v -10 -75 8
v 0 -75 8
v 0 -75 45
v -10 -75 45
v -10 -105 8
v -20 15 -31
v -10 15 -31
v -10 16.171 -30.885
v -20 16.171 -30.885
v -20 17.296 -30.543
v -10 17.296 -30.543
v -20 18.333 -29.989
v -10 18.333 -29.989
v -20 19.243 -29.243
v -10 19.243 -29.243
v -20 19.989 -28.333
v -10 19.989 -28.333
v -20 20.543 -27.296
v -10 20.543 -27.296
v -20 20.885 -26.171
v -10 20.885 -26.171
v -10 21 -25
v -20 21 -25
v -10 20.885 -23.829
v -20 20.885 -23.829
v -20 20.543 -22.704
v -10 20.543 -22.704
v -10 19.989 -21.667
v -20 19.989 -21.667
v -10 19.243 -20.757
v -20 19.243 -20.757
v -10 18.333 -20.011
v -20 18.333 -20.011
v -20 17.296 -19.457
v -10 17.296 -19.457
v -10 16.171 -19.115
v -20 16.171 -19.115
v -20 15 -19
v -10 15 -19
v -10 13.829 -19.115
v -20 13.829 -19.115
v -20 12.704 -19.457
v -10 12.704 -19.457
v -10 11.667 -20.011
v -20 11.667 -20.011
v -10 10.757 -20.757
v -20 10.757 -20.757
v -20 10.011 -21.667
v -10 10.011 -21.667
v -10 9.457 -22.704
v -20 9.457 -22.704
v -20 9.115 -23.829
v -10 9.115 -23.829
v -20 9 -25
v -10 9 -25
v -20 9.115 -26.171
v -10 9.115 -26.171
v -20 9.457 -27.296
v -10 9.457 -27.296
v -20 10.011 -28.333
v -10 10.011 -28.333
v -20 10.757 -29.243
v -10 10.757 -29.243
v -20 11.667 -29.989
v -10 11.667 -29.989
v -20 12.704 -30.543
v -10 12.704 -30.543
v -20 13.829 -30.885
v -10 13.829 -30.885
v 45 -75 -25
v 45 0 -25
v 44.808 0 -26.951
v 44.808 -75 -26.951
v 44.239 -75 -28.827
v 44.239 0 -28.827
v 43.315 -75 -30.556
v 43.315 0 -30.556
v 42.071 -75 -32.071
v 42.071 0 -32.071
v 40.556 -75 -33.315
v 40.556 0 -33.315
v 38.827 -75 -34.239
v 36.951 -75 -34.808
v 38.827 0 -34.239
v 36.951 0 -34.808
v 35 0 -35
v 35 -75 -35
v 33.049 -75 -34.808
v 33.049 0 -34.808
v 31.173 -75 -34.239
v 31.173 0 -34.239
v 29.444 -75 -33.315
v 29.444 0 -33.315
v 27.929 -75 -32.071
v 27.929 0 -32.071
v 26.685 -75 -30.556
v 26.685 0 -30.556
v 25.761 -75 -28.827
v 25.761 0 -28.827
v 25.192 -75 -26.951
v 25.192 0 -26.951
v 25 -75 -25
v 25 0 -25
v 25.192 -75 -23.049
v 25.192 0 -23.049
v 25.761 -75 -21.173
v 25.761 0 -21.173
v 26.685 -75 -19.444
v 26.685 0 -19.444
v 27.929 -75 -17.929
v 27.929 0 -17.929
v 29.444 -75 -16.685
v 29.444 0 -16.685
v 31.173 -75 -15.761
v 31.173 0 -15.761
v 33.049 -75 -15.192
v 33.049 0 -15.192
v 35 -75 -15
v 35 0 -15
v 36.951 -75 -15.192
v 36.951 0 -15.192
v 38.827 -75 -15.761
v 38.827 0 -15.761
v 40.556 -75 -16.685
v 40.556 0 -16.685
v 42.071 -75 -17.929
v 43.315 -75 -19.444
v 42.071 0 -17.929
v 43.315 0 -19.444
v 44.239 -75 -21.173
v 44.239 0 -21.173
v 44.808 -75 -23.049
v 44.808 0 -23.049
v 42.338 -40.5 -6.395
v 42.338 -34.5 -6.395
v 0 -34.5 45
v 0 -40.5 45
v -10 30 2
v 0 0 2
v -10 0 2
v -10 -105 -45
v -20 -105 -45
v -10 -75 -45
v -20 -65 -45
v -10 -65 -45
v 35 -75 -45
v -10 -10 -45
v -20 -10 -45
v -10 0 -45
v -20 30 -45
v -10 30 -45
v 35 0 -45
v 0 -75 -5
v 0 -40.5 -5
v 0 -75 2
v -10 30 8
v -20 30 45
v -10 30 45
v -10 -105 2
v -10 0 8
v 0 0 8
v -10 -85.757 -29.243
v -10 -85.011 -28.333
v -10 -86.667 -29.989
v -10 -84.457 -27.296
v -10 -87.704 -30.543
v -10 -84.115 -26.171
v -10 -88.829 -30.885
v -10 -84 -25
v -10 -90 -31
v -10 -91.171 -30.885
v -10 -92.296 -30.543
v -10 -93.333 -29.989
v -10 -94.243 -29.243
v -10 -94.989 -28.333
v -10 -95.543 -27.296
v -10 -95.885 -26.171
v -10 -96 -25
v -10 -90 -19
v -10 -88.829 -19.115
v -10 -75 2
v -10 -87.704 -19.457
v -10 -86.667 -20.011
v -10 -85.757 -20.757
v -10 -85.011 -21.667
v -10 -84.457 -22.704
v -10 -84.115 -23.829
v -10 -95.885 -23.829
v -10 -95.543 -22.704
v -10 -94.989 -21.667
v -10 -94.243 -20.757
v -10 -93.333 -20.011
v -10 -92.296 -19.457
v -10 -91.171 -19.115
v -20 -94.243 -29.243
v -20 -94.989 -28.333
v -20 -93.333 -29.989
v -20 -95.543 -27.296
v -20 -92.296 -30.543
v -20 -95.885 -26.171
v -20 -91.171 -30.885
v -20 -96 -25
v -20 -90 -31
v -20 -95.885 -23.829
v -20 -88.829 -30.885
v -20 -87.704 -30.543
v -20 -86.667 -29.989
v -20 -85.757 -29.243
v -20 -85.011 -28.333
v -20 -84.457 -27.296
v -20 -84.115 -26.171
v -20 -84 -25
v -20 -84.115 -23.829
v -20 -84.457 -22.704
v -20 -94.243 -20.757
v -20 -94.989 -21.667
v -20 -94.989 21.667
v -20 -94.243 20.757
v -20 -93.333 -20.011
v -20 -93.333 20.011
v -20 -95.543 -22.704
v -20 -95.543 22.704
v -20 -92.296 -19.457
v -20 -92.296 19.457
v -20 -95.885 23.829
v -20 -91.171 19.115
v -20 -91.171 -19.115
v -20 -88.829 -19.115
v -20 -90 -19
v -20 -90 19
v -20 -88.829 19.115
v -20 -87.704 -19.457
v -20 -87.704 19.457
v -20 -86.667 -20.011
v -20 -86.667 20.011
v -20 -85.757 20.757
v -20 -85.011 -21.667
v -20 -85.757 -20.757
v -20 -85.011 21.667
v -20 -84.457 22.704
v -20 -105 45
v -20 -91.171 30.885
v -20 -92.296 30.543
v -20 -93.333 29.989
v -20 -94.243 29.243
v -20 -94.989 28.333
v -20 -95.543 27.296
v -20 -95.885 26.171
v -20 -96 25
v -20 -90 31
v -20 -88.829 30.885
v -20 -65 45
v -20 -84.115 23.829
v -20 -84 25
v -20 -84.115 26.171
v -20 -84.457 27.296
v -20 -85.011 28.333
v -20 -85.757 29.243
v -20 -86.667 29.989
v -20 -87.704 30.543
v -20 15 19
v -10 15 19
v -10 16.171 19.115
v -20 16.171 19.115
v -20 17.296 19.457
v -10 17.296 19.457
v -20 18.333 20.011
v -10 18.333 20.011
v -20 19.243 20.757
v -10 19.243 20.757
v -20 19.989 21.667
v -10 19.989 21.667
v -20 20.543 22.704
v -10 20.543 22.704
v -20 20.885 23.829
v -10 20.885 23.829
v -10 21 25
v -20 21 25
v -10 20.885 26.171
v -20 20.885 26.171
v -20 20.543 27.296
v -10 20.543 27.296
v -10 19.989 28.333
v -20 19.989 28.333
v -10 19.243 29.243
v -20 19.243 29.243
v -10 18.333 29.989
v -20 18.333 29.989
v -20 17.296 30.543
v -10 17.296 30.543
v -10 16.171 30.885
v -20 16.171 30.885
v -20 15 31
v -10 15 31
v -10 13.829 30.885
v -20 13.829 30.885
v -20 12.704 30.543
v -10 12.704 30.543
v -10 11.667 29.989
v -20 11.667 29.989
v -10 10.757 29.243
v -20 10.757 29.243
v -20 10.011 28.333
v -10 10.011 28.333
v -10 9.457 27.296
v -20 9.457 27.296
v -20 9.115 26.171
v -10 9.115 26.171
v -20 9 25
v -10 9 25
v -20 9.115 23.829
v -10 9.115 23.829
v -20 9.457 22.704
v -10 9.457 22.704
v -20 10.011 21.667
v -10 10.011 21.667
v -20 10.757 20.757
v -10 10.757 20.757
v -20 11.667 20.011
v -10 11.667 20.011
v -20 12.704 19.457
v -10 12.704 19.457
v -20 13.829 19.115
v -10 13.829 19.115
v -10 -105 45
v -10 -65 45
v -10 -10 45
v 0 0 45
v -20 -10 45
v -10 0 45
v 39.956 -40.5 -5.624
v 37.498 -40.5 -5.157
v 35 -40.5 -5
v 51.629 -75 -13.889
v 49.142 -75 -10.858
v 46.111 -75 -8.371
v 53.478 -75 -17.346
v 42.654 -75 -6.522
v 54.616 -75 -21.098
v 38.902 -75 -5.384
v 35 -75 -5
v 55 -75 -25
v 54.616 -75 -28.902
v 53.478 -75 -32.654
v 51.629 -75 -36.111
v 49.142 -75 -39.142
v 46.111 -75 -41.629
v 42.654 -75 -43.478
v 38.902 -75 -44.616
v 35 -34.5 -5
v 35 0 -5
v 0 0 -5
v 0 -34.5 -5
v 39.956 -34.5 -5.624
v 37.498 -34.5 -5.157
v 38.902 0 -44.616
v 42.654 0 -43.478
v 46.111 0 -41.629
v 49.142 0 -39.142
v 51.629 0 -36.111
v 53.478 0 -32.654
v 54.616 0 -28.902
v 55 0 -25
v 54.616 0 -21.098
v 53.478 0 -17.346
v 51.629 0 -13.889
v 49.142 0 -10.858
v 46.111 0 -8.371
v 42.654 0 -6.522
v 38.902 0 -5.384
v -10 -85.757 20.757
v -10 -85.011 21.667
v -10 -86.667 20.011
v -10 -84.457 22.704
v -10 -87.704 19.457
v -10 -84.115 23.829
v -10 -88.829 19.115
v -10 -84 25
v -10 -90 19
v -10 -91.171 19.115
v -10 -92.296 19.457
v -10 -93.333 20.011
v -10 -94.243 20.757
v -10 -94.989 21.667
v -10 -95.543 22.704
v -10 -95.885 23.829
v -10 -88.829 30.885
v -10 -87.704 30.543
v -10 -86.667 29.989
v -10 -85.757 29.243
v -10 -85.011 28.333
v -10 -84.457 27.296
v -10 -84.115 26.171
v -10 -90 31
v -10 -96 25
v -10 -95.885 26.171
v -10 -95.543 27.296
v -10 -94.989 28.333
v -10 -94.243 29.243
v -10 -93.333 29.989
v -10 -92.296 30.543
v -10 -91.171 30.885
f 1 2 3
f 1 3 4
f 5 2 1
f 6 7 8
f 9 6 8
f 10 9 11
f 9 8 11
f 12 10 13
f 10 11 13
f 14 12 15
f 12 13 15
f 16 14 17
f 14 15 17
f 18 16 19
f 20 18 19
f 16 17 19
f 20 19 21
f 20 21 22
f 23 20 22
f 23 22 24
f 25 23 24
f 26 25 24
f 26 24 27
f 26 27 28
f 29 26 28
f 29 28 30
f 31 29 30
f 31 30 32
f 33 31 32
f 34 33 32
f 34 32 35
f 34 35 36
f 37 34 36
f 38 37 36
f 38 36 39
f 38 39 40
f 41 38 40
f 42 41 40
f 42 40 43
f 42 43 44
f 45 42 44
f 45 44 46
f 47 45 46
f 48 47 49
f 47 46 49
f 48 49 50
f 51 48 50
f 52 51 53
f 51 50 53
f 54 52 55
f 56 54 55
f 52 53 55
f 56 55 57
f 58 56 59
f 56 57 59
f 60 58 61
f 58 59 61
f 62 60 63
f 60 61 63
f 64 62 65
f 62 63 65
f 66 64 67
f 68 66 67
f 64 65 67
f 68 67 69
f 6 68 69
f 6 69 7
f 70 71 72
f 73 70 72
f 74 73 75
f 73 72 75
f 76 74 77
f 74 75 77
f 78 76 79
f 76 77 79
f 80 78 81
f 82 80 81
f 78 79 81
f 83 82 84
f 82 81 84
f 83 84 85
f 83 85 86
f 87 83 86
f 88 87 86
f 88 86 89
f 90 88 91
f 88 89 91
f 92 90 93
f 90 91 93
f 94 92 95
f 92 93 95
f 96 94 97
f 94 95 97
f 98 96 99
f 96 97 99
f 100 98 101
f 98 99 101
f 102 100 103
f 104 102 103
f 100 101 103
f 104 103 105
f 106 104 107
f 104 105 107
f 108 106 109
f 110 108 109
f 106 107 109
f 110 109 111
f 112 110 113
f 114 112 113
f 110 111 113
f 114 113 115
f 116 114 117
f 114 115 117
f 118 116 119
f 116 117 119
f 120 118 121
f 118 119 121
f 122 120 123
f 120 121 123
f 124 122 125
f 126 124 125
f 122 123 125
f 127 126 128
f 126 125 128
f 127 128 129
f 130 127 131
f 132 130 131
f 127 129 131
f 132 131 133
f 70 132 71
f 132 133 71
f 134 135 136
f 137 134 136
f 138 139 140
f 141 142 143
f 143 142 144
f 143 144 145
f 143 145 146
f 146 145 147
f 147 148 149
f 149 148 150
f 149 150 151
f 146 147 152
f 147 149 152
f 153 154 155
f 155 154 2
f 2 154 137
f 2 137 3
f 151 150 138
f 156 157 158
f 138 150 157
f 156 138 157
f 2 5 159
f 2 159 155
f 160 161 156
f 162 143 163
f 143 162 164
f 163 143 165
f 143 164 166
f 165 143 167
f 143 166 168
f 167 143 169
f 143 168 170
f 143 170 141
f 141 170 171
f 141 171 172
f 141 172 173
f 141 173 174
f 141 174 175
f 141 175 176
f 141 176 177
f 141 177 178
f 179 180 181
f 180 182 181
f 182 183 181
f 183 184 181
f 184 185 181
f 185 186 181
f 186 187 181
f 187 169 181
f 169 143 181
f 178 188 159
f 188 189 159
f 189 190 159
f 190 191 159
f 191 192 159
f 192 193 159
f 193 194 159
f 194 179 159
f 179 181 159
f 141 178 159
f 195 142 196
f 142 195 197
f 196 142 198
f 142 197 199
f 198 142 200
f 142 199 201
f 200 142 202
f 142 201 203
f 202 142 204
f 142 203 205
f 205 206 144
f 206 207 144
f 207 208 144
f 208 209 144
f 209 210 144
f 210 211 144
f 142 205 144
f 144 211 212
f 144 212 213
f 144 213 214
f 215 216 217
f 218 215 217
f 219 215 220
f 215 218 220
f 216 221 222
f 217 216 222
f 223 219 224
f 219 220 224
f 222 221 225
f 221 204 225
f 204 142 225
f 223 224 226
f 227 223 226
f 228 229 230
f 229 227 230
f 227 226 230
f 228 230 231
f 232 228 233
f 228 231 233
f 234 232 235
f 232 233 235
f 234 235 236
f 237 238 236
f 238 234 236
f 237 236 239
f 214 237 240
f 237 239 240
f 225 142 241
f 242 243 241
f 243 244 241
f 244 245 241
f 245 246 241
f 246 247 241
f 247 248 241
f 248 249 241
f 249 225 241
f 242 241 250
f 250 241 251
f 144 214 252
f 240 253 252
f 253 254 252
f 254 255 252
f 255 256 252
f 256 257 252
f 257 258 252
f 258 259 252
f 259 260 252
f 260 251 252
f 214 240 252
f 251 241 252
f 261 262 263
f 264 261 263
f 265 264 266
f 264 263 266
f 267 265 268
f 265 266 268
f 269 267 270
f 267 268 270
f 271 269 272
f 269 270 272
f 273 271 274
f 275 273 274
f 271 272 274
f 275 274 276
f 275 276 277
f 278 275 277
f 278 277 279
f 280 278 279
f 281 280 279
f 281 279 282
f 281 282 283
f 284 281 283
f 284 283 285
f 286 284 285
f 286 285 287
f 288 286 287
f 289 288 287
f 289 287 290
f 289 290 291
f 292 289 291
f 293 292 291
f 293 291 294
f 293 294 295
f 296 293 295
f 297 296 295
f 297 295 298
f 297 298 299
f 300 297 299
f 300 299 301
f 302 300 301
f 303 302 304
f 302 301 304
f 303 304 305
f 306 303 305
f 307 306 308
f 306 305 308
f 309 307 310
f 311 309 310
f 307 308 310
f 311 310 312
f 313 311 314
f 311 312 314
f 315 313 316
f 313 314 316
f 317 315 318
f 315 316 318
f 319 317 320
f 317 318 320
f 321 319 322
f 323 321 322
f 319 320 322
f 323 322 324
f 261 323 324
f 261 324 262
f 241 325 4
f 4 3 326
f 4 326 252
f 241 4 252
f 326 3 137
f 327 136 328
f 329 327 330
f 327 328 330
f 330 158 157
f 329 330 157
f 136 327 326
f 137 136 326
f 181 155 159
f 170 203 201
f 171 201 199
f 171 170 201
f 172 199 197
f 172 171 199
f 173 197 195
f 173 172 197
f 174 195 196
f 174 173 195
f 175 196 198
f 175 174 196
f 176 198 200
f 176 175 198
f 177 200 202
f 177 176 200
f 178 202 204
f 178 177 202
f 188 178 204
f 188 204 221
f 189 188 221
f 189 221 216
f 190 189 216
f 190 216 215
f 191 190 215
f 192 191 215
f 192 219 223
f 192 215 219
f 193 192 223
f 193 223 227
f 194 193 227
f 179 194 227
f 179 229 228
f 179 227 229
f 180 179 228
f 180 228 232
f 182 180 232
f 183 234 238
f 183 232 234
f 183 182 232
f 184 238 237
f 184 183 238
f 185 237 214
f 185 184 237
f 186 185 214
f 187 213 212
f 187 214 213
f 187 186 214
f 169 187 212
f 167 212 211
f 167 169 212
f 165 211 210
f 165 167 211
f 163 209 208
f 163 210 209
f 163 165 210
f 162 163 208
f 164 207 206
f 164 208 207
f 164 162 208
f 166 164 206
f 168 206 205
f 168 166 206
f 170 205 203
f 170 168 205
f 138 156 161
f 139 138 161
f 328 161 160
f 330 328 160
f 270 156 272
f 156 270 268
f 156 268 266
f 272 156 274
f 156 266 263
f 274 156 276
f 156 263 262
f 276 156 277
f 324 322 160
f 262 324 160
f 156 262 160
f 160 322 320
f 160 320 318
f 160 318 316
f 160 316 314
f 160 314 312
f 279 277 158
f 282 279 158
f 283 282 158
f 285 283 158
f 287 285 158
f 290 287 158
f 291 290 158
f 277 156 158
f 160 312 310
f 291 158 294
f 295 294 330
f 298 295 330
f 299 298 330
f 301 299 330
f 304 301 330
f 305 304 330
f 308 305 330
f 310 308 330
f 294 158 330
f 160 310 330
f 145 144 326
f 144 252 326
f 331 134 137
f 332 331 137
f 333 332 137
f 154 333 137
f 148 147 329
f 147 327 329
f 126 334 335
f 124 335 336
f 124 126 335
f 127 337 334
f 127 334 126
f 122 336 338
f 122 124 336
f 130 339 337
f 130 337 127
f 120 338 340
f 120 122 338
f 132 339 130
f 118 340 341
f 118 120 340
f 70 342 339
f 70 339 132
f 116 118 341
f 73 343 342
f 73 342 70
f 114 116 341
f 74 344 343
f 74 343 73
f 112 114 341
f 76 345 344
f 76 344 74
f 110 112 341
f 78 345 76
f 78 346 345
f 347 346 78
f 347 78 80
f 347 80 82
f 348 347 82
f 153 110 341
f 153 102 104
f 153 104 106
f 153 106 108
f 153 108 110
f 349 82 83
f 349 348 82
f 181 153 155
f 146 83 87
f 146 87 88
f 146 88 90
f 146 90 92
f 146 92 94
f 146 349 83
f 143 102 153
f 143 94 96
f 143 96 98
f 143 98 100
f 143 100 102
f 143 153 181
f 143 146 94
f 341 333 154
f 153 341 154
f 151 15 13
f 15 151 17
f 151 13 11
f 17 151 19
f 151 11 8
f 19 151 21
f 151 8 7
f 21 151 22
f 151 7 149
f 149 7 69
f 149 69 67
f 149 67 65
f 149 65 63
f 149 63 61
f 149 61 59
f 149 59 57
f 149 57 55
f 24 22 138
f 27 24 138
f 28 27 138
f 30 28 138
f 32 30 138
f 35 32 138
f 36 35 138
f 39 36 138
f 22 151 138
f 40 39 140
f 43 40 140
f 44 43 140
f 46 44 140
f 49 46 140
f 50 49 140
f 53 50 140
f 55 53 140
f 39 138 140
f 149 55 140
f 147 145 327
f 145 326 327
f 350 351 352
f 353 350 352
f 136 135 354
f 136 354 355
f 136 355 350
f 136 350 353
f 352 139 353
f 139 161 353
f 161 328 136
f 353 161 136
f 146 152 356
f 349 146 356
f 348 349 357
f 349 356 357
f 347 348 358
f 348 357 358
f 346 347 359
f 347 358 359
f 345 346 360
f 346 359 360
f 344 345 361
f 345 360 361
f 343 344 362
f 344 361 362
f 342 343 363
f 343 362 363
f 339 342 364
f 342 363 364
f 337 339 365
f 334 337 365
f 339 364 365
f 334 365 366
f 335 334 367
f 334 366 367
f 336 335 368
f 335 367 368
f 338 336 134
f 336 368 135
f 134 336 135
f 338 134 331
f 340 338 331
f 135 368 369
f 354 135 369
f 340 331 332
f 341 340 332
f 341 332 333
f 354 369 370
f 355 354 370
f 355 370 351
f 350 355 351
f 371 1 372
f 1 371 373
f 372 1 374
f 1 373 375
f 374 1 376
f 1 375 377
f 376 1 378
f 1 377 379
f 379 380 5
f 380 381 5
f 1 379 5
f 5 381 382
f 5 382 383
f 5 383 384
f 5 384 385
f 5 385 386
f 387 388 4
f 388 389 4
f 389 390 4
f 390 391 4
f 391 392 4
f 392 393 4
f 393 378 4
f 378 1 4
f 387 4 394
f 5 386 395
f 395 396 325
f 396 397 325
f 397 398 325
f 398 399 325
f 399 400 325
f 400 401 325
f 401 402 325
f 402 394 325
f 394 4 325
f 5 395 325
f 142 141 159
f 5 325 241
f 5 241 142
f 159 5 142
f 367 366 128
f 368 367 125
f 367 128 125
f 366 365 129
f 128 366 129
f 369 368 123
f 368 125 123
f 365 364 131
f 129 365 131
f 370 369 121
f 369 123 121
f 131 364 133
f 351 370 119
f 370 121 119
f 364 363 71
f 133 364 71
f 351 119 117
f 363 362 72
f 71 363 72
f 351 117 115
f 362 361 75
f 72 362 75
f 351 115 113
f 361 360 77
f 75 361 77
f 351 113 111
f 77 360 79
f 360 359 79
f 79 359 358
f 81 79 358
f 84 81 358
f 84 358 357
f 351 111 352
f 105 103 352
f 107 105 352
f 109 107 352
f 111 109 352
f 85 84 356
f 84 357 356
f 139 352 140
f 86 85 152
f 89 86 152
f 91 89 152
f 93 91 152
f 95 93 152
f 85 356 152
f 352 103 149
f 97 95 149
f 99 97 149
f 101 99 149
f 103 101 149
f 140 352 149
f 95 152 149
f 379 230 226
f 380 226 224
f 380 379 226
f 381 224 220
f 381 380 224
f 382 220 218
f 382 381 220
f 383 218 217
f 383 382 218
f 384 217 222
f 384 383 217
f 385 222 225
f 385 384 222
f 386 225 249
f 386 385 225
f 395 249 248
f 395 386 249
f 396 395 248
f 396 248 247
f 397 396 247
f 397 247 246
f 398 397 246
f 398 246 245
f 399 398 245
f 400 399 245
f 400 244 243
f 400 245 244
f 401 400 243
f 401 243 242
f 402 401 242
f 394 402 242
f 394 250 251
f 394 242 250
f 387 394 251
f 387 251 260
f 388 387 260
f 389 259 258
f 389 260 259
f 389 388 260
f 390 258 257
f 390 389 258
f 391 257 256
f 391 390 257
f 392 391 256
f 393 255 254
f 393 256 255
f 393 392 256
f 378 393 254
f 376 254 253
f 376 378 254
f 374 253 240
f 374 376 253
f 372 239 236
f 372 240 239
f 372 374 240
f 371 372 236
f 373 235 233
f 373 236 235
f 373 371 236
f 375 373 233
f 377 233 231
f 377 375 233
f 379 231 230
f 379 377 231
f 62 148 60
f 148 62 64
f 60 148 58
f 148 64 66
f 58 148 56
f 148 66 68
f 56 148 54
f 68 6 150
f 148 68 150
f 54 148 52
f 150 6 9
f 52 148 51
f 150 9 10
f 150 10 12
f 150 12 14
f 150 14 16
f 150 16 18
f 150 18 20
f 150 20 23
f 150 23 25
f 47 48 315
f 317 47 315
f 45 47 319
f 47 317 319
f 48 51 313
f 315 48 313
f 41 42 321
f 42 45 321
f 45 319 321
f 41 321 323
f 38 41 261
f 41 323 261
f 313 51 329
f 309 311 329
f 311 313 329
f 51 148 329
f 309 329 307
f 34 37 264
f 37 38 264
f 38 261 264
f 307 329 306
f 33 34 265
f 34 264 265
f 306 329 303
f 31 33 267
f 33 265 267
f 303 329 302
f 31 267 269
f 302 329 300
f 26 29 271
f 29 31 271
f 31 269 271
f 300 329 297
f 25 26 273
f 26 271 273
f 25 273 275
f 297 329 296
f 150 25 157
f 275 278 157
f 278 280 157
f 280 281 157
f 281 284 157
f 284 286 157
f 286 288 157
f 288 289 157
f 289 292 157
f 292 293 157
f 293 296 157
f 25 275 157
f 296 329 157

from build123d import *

# Parameters (mm, degrees)
Y_KSEKLIK_EKSTR_ZYON1_DEPTH = 45
Y_KSEKLIK_EKSTR_ZYON2_DEPTH = 75
IZIM3_R                     = 10
KES_EKSTR_ZYON1_DEPTH       = 75
IZIM4_R                     = 6
KES_EKSTR_ZYON2_DEPTH       = 11
Y_KSEKLIK_EKSTR_ZYON3_DEPTH = 6
Y_KSEKLIK_EKSTR_ZYON4_DEPTH = 3


with BuildPart() as part:
    # Çizim1 → Yükseklik-Ekstrüzyon1 (new body, symmetric)
    with BuildSketch(Plane.XY):
        Polygon((0, 0), (0, -75), (-10, -75), (-10, -105), (-20, -105), (-20, -65), (-10, -65), (-10, -10), (-20, -10), (-20, 30), (-10, 30), (-10, 0), align=None)
    extrude(amount=Y_KSEKLIK_EKSTR_ZYON1_DEPTH, both=True)

    # Çizim2 → Yükseklik-Ekstrüzyon2 (add)
    with BuildSketch(Plane(origin=(0, 0, 0), x_dir=(1, 0, 0), z_dir=(0, 1, 0))):
        with BuildLine():
            Line((0, 45), (35, 45))
            ThreePointArc((35, 45), (55, 25), (35, 5))
            Line((35, 5), (0, 5))
            Line((0, 5), (0, 45))
        make_face()
    extrude(amount=-Y_KSEKLIK_EKSTR_ZYON2_DEPTH)

    # Çizim3 → Kes-Ekstrüzyon1 (cut)
    with BuildSketch(Plane(origin=(0, 0, 0), x_dir=(1, 0, 0), z_dir=(0, 1, 0))):
        with Locations((35, 25)):
            Circle(IZIM3_R)
    extrude(amount=-KES_EKSTR_ZYON1_DEPTH, mode=Mode.SUBTRACT)

    # Çizim4 → Kes-Ekstrüzyon2 (cut, through all)
    with BuildSketch(Plane(origin=(-10, 0, 0), x_dir=(0, 0, -1), z_dir=(1, 0, 0))):
        with Locations((-25, 15)):
            Circle(IZIM4_R)
        with Locations((25, 15)):
            Circle(IZIM4_R)
    kes_ekstr_zyon2 = extrude(amount=-KES_EKSTR_ZYON2_DEPTH, mode=Mode.SUBTRACT)

    # Aynalama1: Kes-Ekstrüzyon2 across plane
    add(kes_ekstr_zyon2.mirror(Plane.ZX.offset(-37.5)), mode=Mode.SUBTRACT)

    # Çizim5 → Yükseklik-Ekstrüzyon3 (add)
    with BuildSketch(Plane.XY.offset(8)):
        Polygon((-10, 30), (0, 0), (-10, 0), align=None)
    y_kseklik_ekstr_zyon3 = extrude(amount=-Y_KSEKLIK_EKSTR_ZYON3_DEPTH)

    # Aynalama2: Yükseklik-Ekstrüzyon3 across plane
    add(y_kseklik_ekstr_zyon3.mirror(Plane.ZX.offset(-37.5)))

    # Çizim6 → Yükseklik-Ekstrüzyon4 (add, symmetric)
    with BuildSketch(Plane(origin=(0, -37.5, 0), x_dir=(1, 0, 0), z_dir=(0, 1, 0))):
        Polygon((0, 9.626666966), (45, 9.626666966), (0, -45), align=None)
    extrude(amount=Y_KSEKLIK_EKSTR_ZYON4_DEPTH, both=True)


solid = part.part
